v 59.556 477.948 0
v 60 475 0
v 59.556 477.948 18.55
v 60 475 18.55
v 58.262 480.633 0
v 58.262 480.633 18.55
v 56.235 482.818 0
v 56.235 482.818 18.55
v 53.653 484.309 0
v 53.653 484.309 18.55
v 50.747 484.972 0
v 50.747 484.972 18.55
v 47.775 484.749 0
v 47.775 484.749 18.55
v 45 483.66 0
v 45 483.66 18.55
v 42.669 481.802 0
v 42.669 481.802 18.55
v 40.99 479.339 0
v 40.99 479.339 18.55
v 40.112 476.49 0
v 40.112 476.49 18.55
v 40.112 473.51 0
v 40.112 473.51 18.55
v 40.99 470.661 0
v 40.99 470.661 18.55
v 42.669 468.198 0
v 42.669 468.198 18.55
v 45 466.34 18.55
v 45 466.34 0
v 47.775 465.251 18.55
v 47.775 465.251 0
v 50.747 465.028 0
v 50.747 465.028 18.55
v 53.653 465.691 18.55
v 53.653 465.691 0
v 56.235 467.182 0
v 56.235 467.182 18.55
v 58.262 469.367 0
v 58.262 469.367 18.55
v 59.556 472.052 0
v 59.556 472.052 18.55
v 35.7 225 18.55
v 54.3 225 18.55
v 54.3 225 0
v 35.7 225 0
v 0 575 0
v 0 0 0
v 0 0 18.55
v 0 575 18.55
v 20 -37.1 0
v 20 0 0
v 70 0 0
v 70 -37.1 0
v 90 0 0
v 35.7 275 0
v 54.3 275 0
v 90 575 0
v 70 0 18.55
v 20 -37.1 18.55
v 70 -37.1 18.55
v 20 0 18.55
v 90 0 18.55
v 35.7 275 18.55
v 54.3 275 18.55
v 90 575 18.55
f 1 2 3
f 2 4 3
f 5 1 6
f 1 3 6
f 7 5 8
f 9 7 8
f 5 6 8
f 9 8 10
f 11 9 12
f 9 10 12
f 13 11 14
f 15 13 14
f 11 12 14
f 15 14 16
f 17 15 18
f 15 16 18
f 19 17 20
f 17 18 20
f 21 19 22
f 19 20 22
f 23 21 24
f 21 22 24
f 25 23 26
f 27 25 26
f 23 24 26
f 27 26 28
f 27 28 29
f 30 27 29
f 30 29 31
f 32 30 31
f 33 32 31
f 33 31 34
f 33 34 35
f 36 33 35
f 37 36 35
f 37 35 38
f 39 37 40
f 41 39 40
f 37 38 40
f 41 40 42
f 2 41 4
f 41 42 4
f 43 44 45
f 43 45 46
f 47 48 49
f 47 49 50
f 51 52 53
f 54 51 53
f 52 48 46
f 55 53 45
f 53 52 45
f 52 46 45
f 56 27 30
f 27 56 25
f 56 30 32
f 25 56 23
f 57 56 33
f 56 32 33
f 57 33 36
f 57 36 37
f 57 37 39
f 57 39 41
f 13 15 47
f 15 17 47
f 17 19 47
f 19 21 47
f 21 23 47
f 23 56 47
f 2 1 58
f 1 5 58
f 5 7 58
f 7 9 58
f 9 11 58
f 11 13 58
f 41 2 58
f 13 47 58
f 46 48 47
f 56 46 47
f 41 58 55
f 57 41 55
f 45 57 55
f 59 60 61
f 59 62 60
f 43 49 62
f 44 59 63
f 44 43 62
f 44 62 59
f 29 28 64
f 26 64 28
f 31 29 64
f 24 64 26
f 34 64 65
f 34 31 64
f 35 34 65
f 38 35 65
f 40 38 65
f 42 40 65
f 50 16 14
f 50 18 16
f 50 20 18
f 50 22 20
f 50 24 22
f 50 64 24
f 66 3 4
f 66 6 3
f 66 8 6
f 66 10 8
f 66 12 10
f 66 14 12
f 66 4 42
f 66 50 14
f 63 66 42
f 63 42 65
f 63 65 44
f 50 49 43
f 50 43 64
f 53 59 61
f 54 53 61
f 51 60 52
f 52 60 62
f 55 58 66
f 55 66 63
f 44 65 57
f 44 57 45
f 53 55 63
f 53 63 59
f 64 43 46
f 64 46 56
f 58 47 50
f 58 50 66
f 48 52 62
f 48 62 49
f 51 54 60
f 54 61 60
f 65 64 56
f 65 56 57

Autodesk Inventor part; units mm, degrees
ref_plane "YZ Plane" through (0, 0, 0) normal (1, 0, 0) x (0, 1, 0)
ref_plane "XZ Plane" through (0, 0, 0) normal (0, 1, 0) x (-1, 0, 0)
ref_plane "XY Plane" through (0, 0, 0) normal (0, 0, 1) x (1, 0, 0)
sketch "Sketch1" plane through (0, 0, 0) normal (0, 0, 1) x (1, 0, 0)
  line L0 (0, 0) -> (0, 575)
  line L1 (0, 575) -> (90, 575)
  line L2 (90, 575) -> (90, 0)
  line L3 (90, 0) -> (0, 0)
  dimension "d0" = 575
  dimension "d1" = 90
extrude "Extrusion1" add sketch "Sketch1" along normal blind 18.55
sketch "Sketch2" plane through (0, 0, 18.55) normal (0, 0, 1) x (1, 0, 0)
  circle A0 centre (50, 475) radius 10
  line L0 (0, 575) -> (0, 0) projected
  line L1 (0, 475) -> (90, 475) construction
  line L2 (90, 0) -> (90, 575) projected
  line L3 (90, 575) -> (0, 575) projected
  dimension "d4" = 50
  dimension "d5" = 100
  dimension "d6" = 20
extrude "Extrusion2" cut sketch "Sketch2" against normal blind 100
sketch "Sketch3" plane through (0, 0, 18.55) normal (0, 0, 1) x (1, 0, 0)
  line L0 (0, 0) -> (90, 0) projected
  line L1 (20, 0) -> (70, 0)
  line L2 (70, 0) -> (70, -37.1)
  line L3 (70, -37.1) -> (20, -37.1)
  line L4 (20, -37.1) -> (20, 0)
  line L5 (0, 575) -> (0, 0) projected
  line L6 (90, 0) -> (90, 575) projected
  dimension "d9" = 20
  dimension "d10" = 20
  dimension "d11" = 37.1
extrude "Extrusion3" add sketch "Sketch3" against normal blind 18.55
sketch "Sketch4" plane through (0, 0, 18.55) normal (0, 0, 1) x (1, 0, 0)
  line L0 (35.7, 275) -> (54.3, 275)
  line L1 (54.3, 275) -> (54.3, 225)
  line L2 (54.3, 225) -> (35.7, 225)
  line L3 (35.7, 225) -> (35.7, 275)
  line L4 (90, 575) -> (0, 575) projected
  line L5 (35.7, 250) -> (0, 250) construction
  line L6 (0, 575) -> (0, 0) projected
  line L7 (54.3, 250) -> (90, 250) construction
  line L8 (90, 0) -> (90, 575) projected
  dimension "d14" = 300
  dimension "d15" = 50
  dimension "d16" = 18.6
extrude "Extrusion4" cut sketch "Sketch4" against normal blind 200
properties part number "table_foot"
